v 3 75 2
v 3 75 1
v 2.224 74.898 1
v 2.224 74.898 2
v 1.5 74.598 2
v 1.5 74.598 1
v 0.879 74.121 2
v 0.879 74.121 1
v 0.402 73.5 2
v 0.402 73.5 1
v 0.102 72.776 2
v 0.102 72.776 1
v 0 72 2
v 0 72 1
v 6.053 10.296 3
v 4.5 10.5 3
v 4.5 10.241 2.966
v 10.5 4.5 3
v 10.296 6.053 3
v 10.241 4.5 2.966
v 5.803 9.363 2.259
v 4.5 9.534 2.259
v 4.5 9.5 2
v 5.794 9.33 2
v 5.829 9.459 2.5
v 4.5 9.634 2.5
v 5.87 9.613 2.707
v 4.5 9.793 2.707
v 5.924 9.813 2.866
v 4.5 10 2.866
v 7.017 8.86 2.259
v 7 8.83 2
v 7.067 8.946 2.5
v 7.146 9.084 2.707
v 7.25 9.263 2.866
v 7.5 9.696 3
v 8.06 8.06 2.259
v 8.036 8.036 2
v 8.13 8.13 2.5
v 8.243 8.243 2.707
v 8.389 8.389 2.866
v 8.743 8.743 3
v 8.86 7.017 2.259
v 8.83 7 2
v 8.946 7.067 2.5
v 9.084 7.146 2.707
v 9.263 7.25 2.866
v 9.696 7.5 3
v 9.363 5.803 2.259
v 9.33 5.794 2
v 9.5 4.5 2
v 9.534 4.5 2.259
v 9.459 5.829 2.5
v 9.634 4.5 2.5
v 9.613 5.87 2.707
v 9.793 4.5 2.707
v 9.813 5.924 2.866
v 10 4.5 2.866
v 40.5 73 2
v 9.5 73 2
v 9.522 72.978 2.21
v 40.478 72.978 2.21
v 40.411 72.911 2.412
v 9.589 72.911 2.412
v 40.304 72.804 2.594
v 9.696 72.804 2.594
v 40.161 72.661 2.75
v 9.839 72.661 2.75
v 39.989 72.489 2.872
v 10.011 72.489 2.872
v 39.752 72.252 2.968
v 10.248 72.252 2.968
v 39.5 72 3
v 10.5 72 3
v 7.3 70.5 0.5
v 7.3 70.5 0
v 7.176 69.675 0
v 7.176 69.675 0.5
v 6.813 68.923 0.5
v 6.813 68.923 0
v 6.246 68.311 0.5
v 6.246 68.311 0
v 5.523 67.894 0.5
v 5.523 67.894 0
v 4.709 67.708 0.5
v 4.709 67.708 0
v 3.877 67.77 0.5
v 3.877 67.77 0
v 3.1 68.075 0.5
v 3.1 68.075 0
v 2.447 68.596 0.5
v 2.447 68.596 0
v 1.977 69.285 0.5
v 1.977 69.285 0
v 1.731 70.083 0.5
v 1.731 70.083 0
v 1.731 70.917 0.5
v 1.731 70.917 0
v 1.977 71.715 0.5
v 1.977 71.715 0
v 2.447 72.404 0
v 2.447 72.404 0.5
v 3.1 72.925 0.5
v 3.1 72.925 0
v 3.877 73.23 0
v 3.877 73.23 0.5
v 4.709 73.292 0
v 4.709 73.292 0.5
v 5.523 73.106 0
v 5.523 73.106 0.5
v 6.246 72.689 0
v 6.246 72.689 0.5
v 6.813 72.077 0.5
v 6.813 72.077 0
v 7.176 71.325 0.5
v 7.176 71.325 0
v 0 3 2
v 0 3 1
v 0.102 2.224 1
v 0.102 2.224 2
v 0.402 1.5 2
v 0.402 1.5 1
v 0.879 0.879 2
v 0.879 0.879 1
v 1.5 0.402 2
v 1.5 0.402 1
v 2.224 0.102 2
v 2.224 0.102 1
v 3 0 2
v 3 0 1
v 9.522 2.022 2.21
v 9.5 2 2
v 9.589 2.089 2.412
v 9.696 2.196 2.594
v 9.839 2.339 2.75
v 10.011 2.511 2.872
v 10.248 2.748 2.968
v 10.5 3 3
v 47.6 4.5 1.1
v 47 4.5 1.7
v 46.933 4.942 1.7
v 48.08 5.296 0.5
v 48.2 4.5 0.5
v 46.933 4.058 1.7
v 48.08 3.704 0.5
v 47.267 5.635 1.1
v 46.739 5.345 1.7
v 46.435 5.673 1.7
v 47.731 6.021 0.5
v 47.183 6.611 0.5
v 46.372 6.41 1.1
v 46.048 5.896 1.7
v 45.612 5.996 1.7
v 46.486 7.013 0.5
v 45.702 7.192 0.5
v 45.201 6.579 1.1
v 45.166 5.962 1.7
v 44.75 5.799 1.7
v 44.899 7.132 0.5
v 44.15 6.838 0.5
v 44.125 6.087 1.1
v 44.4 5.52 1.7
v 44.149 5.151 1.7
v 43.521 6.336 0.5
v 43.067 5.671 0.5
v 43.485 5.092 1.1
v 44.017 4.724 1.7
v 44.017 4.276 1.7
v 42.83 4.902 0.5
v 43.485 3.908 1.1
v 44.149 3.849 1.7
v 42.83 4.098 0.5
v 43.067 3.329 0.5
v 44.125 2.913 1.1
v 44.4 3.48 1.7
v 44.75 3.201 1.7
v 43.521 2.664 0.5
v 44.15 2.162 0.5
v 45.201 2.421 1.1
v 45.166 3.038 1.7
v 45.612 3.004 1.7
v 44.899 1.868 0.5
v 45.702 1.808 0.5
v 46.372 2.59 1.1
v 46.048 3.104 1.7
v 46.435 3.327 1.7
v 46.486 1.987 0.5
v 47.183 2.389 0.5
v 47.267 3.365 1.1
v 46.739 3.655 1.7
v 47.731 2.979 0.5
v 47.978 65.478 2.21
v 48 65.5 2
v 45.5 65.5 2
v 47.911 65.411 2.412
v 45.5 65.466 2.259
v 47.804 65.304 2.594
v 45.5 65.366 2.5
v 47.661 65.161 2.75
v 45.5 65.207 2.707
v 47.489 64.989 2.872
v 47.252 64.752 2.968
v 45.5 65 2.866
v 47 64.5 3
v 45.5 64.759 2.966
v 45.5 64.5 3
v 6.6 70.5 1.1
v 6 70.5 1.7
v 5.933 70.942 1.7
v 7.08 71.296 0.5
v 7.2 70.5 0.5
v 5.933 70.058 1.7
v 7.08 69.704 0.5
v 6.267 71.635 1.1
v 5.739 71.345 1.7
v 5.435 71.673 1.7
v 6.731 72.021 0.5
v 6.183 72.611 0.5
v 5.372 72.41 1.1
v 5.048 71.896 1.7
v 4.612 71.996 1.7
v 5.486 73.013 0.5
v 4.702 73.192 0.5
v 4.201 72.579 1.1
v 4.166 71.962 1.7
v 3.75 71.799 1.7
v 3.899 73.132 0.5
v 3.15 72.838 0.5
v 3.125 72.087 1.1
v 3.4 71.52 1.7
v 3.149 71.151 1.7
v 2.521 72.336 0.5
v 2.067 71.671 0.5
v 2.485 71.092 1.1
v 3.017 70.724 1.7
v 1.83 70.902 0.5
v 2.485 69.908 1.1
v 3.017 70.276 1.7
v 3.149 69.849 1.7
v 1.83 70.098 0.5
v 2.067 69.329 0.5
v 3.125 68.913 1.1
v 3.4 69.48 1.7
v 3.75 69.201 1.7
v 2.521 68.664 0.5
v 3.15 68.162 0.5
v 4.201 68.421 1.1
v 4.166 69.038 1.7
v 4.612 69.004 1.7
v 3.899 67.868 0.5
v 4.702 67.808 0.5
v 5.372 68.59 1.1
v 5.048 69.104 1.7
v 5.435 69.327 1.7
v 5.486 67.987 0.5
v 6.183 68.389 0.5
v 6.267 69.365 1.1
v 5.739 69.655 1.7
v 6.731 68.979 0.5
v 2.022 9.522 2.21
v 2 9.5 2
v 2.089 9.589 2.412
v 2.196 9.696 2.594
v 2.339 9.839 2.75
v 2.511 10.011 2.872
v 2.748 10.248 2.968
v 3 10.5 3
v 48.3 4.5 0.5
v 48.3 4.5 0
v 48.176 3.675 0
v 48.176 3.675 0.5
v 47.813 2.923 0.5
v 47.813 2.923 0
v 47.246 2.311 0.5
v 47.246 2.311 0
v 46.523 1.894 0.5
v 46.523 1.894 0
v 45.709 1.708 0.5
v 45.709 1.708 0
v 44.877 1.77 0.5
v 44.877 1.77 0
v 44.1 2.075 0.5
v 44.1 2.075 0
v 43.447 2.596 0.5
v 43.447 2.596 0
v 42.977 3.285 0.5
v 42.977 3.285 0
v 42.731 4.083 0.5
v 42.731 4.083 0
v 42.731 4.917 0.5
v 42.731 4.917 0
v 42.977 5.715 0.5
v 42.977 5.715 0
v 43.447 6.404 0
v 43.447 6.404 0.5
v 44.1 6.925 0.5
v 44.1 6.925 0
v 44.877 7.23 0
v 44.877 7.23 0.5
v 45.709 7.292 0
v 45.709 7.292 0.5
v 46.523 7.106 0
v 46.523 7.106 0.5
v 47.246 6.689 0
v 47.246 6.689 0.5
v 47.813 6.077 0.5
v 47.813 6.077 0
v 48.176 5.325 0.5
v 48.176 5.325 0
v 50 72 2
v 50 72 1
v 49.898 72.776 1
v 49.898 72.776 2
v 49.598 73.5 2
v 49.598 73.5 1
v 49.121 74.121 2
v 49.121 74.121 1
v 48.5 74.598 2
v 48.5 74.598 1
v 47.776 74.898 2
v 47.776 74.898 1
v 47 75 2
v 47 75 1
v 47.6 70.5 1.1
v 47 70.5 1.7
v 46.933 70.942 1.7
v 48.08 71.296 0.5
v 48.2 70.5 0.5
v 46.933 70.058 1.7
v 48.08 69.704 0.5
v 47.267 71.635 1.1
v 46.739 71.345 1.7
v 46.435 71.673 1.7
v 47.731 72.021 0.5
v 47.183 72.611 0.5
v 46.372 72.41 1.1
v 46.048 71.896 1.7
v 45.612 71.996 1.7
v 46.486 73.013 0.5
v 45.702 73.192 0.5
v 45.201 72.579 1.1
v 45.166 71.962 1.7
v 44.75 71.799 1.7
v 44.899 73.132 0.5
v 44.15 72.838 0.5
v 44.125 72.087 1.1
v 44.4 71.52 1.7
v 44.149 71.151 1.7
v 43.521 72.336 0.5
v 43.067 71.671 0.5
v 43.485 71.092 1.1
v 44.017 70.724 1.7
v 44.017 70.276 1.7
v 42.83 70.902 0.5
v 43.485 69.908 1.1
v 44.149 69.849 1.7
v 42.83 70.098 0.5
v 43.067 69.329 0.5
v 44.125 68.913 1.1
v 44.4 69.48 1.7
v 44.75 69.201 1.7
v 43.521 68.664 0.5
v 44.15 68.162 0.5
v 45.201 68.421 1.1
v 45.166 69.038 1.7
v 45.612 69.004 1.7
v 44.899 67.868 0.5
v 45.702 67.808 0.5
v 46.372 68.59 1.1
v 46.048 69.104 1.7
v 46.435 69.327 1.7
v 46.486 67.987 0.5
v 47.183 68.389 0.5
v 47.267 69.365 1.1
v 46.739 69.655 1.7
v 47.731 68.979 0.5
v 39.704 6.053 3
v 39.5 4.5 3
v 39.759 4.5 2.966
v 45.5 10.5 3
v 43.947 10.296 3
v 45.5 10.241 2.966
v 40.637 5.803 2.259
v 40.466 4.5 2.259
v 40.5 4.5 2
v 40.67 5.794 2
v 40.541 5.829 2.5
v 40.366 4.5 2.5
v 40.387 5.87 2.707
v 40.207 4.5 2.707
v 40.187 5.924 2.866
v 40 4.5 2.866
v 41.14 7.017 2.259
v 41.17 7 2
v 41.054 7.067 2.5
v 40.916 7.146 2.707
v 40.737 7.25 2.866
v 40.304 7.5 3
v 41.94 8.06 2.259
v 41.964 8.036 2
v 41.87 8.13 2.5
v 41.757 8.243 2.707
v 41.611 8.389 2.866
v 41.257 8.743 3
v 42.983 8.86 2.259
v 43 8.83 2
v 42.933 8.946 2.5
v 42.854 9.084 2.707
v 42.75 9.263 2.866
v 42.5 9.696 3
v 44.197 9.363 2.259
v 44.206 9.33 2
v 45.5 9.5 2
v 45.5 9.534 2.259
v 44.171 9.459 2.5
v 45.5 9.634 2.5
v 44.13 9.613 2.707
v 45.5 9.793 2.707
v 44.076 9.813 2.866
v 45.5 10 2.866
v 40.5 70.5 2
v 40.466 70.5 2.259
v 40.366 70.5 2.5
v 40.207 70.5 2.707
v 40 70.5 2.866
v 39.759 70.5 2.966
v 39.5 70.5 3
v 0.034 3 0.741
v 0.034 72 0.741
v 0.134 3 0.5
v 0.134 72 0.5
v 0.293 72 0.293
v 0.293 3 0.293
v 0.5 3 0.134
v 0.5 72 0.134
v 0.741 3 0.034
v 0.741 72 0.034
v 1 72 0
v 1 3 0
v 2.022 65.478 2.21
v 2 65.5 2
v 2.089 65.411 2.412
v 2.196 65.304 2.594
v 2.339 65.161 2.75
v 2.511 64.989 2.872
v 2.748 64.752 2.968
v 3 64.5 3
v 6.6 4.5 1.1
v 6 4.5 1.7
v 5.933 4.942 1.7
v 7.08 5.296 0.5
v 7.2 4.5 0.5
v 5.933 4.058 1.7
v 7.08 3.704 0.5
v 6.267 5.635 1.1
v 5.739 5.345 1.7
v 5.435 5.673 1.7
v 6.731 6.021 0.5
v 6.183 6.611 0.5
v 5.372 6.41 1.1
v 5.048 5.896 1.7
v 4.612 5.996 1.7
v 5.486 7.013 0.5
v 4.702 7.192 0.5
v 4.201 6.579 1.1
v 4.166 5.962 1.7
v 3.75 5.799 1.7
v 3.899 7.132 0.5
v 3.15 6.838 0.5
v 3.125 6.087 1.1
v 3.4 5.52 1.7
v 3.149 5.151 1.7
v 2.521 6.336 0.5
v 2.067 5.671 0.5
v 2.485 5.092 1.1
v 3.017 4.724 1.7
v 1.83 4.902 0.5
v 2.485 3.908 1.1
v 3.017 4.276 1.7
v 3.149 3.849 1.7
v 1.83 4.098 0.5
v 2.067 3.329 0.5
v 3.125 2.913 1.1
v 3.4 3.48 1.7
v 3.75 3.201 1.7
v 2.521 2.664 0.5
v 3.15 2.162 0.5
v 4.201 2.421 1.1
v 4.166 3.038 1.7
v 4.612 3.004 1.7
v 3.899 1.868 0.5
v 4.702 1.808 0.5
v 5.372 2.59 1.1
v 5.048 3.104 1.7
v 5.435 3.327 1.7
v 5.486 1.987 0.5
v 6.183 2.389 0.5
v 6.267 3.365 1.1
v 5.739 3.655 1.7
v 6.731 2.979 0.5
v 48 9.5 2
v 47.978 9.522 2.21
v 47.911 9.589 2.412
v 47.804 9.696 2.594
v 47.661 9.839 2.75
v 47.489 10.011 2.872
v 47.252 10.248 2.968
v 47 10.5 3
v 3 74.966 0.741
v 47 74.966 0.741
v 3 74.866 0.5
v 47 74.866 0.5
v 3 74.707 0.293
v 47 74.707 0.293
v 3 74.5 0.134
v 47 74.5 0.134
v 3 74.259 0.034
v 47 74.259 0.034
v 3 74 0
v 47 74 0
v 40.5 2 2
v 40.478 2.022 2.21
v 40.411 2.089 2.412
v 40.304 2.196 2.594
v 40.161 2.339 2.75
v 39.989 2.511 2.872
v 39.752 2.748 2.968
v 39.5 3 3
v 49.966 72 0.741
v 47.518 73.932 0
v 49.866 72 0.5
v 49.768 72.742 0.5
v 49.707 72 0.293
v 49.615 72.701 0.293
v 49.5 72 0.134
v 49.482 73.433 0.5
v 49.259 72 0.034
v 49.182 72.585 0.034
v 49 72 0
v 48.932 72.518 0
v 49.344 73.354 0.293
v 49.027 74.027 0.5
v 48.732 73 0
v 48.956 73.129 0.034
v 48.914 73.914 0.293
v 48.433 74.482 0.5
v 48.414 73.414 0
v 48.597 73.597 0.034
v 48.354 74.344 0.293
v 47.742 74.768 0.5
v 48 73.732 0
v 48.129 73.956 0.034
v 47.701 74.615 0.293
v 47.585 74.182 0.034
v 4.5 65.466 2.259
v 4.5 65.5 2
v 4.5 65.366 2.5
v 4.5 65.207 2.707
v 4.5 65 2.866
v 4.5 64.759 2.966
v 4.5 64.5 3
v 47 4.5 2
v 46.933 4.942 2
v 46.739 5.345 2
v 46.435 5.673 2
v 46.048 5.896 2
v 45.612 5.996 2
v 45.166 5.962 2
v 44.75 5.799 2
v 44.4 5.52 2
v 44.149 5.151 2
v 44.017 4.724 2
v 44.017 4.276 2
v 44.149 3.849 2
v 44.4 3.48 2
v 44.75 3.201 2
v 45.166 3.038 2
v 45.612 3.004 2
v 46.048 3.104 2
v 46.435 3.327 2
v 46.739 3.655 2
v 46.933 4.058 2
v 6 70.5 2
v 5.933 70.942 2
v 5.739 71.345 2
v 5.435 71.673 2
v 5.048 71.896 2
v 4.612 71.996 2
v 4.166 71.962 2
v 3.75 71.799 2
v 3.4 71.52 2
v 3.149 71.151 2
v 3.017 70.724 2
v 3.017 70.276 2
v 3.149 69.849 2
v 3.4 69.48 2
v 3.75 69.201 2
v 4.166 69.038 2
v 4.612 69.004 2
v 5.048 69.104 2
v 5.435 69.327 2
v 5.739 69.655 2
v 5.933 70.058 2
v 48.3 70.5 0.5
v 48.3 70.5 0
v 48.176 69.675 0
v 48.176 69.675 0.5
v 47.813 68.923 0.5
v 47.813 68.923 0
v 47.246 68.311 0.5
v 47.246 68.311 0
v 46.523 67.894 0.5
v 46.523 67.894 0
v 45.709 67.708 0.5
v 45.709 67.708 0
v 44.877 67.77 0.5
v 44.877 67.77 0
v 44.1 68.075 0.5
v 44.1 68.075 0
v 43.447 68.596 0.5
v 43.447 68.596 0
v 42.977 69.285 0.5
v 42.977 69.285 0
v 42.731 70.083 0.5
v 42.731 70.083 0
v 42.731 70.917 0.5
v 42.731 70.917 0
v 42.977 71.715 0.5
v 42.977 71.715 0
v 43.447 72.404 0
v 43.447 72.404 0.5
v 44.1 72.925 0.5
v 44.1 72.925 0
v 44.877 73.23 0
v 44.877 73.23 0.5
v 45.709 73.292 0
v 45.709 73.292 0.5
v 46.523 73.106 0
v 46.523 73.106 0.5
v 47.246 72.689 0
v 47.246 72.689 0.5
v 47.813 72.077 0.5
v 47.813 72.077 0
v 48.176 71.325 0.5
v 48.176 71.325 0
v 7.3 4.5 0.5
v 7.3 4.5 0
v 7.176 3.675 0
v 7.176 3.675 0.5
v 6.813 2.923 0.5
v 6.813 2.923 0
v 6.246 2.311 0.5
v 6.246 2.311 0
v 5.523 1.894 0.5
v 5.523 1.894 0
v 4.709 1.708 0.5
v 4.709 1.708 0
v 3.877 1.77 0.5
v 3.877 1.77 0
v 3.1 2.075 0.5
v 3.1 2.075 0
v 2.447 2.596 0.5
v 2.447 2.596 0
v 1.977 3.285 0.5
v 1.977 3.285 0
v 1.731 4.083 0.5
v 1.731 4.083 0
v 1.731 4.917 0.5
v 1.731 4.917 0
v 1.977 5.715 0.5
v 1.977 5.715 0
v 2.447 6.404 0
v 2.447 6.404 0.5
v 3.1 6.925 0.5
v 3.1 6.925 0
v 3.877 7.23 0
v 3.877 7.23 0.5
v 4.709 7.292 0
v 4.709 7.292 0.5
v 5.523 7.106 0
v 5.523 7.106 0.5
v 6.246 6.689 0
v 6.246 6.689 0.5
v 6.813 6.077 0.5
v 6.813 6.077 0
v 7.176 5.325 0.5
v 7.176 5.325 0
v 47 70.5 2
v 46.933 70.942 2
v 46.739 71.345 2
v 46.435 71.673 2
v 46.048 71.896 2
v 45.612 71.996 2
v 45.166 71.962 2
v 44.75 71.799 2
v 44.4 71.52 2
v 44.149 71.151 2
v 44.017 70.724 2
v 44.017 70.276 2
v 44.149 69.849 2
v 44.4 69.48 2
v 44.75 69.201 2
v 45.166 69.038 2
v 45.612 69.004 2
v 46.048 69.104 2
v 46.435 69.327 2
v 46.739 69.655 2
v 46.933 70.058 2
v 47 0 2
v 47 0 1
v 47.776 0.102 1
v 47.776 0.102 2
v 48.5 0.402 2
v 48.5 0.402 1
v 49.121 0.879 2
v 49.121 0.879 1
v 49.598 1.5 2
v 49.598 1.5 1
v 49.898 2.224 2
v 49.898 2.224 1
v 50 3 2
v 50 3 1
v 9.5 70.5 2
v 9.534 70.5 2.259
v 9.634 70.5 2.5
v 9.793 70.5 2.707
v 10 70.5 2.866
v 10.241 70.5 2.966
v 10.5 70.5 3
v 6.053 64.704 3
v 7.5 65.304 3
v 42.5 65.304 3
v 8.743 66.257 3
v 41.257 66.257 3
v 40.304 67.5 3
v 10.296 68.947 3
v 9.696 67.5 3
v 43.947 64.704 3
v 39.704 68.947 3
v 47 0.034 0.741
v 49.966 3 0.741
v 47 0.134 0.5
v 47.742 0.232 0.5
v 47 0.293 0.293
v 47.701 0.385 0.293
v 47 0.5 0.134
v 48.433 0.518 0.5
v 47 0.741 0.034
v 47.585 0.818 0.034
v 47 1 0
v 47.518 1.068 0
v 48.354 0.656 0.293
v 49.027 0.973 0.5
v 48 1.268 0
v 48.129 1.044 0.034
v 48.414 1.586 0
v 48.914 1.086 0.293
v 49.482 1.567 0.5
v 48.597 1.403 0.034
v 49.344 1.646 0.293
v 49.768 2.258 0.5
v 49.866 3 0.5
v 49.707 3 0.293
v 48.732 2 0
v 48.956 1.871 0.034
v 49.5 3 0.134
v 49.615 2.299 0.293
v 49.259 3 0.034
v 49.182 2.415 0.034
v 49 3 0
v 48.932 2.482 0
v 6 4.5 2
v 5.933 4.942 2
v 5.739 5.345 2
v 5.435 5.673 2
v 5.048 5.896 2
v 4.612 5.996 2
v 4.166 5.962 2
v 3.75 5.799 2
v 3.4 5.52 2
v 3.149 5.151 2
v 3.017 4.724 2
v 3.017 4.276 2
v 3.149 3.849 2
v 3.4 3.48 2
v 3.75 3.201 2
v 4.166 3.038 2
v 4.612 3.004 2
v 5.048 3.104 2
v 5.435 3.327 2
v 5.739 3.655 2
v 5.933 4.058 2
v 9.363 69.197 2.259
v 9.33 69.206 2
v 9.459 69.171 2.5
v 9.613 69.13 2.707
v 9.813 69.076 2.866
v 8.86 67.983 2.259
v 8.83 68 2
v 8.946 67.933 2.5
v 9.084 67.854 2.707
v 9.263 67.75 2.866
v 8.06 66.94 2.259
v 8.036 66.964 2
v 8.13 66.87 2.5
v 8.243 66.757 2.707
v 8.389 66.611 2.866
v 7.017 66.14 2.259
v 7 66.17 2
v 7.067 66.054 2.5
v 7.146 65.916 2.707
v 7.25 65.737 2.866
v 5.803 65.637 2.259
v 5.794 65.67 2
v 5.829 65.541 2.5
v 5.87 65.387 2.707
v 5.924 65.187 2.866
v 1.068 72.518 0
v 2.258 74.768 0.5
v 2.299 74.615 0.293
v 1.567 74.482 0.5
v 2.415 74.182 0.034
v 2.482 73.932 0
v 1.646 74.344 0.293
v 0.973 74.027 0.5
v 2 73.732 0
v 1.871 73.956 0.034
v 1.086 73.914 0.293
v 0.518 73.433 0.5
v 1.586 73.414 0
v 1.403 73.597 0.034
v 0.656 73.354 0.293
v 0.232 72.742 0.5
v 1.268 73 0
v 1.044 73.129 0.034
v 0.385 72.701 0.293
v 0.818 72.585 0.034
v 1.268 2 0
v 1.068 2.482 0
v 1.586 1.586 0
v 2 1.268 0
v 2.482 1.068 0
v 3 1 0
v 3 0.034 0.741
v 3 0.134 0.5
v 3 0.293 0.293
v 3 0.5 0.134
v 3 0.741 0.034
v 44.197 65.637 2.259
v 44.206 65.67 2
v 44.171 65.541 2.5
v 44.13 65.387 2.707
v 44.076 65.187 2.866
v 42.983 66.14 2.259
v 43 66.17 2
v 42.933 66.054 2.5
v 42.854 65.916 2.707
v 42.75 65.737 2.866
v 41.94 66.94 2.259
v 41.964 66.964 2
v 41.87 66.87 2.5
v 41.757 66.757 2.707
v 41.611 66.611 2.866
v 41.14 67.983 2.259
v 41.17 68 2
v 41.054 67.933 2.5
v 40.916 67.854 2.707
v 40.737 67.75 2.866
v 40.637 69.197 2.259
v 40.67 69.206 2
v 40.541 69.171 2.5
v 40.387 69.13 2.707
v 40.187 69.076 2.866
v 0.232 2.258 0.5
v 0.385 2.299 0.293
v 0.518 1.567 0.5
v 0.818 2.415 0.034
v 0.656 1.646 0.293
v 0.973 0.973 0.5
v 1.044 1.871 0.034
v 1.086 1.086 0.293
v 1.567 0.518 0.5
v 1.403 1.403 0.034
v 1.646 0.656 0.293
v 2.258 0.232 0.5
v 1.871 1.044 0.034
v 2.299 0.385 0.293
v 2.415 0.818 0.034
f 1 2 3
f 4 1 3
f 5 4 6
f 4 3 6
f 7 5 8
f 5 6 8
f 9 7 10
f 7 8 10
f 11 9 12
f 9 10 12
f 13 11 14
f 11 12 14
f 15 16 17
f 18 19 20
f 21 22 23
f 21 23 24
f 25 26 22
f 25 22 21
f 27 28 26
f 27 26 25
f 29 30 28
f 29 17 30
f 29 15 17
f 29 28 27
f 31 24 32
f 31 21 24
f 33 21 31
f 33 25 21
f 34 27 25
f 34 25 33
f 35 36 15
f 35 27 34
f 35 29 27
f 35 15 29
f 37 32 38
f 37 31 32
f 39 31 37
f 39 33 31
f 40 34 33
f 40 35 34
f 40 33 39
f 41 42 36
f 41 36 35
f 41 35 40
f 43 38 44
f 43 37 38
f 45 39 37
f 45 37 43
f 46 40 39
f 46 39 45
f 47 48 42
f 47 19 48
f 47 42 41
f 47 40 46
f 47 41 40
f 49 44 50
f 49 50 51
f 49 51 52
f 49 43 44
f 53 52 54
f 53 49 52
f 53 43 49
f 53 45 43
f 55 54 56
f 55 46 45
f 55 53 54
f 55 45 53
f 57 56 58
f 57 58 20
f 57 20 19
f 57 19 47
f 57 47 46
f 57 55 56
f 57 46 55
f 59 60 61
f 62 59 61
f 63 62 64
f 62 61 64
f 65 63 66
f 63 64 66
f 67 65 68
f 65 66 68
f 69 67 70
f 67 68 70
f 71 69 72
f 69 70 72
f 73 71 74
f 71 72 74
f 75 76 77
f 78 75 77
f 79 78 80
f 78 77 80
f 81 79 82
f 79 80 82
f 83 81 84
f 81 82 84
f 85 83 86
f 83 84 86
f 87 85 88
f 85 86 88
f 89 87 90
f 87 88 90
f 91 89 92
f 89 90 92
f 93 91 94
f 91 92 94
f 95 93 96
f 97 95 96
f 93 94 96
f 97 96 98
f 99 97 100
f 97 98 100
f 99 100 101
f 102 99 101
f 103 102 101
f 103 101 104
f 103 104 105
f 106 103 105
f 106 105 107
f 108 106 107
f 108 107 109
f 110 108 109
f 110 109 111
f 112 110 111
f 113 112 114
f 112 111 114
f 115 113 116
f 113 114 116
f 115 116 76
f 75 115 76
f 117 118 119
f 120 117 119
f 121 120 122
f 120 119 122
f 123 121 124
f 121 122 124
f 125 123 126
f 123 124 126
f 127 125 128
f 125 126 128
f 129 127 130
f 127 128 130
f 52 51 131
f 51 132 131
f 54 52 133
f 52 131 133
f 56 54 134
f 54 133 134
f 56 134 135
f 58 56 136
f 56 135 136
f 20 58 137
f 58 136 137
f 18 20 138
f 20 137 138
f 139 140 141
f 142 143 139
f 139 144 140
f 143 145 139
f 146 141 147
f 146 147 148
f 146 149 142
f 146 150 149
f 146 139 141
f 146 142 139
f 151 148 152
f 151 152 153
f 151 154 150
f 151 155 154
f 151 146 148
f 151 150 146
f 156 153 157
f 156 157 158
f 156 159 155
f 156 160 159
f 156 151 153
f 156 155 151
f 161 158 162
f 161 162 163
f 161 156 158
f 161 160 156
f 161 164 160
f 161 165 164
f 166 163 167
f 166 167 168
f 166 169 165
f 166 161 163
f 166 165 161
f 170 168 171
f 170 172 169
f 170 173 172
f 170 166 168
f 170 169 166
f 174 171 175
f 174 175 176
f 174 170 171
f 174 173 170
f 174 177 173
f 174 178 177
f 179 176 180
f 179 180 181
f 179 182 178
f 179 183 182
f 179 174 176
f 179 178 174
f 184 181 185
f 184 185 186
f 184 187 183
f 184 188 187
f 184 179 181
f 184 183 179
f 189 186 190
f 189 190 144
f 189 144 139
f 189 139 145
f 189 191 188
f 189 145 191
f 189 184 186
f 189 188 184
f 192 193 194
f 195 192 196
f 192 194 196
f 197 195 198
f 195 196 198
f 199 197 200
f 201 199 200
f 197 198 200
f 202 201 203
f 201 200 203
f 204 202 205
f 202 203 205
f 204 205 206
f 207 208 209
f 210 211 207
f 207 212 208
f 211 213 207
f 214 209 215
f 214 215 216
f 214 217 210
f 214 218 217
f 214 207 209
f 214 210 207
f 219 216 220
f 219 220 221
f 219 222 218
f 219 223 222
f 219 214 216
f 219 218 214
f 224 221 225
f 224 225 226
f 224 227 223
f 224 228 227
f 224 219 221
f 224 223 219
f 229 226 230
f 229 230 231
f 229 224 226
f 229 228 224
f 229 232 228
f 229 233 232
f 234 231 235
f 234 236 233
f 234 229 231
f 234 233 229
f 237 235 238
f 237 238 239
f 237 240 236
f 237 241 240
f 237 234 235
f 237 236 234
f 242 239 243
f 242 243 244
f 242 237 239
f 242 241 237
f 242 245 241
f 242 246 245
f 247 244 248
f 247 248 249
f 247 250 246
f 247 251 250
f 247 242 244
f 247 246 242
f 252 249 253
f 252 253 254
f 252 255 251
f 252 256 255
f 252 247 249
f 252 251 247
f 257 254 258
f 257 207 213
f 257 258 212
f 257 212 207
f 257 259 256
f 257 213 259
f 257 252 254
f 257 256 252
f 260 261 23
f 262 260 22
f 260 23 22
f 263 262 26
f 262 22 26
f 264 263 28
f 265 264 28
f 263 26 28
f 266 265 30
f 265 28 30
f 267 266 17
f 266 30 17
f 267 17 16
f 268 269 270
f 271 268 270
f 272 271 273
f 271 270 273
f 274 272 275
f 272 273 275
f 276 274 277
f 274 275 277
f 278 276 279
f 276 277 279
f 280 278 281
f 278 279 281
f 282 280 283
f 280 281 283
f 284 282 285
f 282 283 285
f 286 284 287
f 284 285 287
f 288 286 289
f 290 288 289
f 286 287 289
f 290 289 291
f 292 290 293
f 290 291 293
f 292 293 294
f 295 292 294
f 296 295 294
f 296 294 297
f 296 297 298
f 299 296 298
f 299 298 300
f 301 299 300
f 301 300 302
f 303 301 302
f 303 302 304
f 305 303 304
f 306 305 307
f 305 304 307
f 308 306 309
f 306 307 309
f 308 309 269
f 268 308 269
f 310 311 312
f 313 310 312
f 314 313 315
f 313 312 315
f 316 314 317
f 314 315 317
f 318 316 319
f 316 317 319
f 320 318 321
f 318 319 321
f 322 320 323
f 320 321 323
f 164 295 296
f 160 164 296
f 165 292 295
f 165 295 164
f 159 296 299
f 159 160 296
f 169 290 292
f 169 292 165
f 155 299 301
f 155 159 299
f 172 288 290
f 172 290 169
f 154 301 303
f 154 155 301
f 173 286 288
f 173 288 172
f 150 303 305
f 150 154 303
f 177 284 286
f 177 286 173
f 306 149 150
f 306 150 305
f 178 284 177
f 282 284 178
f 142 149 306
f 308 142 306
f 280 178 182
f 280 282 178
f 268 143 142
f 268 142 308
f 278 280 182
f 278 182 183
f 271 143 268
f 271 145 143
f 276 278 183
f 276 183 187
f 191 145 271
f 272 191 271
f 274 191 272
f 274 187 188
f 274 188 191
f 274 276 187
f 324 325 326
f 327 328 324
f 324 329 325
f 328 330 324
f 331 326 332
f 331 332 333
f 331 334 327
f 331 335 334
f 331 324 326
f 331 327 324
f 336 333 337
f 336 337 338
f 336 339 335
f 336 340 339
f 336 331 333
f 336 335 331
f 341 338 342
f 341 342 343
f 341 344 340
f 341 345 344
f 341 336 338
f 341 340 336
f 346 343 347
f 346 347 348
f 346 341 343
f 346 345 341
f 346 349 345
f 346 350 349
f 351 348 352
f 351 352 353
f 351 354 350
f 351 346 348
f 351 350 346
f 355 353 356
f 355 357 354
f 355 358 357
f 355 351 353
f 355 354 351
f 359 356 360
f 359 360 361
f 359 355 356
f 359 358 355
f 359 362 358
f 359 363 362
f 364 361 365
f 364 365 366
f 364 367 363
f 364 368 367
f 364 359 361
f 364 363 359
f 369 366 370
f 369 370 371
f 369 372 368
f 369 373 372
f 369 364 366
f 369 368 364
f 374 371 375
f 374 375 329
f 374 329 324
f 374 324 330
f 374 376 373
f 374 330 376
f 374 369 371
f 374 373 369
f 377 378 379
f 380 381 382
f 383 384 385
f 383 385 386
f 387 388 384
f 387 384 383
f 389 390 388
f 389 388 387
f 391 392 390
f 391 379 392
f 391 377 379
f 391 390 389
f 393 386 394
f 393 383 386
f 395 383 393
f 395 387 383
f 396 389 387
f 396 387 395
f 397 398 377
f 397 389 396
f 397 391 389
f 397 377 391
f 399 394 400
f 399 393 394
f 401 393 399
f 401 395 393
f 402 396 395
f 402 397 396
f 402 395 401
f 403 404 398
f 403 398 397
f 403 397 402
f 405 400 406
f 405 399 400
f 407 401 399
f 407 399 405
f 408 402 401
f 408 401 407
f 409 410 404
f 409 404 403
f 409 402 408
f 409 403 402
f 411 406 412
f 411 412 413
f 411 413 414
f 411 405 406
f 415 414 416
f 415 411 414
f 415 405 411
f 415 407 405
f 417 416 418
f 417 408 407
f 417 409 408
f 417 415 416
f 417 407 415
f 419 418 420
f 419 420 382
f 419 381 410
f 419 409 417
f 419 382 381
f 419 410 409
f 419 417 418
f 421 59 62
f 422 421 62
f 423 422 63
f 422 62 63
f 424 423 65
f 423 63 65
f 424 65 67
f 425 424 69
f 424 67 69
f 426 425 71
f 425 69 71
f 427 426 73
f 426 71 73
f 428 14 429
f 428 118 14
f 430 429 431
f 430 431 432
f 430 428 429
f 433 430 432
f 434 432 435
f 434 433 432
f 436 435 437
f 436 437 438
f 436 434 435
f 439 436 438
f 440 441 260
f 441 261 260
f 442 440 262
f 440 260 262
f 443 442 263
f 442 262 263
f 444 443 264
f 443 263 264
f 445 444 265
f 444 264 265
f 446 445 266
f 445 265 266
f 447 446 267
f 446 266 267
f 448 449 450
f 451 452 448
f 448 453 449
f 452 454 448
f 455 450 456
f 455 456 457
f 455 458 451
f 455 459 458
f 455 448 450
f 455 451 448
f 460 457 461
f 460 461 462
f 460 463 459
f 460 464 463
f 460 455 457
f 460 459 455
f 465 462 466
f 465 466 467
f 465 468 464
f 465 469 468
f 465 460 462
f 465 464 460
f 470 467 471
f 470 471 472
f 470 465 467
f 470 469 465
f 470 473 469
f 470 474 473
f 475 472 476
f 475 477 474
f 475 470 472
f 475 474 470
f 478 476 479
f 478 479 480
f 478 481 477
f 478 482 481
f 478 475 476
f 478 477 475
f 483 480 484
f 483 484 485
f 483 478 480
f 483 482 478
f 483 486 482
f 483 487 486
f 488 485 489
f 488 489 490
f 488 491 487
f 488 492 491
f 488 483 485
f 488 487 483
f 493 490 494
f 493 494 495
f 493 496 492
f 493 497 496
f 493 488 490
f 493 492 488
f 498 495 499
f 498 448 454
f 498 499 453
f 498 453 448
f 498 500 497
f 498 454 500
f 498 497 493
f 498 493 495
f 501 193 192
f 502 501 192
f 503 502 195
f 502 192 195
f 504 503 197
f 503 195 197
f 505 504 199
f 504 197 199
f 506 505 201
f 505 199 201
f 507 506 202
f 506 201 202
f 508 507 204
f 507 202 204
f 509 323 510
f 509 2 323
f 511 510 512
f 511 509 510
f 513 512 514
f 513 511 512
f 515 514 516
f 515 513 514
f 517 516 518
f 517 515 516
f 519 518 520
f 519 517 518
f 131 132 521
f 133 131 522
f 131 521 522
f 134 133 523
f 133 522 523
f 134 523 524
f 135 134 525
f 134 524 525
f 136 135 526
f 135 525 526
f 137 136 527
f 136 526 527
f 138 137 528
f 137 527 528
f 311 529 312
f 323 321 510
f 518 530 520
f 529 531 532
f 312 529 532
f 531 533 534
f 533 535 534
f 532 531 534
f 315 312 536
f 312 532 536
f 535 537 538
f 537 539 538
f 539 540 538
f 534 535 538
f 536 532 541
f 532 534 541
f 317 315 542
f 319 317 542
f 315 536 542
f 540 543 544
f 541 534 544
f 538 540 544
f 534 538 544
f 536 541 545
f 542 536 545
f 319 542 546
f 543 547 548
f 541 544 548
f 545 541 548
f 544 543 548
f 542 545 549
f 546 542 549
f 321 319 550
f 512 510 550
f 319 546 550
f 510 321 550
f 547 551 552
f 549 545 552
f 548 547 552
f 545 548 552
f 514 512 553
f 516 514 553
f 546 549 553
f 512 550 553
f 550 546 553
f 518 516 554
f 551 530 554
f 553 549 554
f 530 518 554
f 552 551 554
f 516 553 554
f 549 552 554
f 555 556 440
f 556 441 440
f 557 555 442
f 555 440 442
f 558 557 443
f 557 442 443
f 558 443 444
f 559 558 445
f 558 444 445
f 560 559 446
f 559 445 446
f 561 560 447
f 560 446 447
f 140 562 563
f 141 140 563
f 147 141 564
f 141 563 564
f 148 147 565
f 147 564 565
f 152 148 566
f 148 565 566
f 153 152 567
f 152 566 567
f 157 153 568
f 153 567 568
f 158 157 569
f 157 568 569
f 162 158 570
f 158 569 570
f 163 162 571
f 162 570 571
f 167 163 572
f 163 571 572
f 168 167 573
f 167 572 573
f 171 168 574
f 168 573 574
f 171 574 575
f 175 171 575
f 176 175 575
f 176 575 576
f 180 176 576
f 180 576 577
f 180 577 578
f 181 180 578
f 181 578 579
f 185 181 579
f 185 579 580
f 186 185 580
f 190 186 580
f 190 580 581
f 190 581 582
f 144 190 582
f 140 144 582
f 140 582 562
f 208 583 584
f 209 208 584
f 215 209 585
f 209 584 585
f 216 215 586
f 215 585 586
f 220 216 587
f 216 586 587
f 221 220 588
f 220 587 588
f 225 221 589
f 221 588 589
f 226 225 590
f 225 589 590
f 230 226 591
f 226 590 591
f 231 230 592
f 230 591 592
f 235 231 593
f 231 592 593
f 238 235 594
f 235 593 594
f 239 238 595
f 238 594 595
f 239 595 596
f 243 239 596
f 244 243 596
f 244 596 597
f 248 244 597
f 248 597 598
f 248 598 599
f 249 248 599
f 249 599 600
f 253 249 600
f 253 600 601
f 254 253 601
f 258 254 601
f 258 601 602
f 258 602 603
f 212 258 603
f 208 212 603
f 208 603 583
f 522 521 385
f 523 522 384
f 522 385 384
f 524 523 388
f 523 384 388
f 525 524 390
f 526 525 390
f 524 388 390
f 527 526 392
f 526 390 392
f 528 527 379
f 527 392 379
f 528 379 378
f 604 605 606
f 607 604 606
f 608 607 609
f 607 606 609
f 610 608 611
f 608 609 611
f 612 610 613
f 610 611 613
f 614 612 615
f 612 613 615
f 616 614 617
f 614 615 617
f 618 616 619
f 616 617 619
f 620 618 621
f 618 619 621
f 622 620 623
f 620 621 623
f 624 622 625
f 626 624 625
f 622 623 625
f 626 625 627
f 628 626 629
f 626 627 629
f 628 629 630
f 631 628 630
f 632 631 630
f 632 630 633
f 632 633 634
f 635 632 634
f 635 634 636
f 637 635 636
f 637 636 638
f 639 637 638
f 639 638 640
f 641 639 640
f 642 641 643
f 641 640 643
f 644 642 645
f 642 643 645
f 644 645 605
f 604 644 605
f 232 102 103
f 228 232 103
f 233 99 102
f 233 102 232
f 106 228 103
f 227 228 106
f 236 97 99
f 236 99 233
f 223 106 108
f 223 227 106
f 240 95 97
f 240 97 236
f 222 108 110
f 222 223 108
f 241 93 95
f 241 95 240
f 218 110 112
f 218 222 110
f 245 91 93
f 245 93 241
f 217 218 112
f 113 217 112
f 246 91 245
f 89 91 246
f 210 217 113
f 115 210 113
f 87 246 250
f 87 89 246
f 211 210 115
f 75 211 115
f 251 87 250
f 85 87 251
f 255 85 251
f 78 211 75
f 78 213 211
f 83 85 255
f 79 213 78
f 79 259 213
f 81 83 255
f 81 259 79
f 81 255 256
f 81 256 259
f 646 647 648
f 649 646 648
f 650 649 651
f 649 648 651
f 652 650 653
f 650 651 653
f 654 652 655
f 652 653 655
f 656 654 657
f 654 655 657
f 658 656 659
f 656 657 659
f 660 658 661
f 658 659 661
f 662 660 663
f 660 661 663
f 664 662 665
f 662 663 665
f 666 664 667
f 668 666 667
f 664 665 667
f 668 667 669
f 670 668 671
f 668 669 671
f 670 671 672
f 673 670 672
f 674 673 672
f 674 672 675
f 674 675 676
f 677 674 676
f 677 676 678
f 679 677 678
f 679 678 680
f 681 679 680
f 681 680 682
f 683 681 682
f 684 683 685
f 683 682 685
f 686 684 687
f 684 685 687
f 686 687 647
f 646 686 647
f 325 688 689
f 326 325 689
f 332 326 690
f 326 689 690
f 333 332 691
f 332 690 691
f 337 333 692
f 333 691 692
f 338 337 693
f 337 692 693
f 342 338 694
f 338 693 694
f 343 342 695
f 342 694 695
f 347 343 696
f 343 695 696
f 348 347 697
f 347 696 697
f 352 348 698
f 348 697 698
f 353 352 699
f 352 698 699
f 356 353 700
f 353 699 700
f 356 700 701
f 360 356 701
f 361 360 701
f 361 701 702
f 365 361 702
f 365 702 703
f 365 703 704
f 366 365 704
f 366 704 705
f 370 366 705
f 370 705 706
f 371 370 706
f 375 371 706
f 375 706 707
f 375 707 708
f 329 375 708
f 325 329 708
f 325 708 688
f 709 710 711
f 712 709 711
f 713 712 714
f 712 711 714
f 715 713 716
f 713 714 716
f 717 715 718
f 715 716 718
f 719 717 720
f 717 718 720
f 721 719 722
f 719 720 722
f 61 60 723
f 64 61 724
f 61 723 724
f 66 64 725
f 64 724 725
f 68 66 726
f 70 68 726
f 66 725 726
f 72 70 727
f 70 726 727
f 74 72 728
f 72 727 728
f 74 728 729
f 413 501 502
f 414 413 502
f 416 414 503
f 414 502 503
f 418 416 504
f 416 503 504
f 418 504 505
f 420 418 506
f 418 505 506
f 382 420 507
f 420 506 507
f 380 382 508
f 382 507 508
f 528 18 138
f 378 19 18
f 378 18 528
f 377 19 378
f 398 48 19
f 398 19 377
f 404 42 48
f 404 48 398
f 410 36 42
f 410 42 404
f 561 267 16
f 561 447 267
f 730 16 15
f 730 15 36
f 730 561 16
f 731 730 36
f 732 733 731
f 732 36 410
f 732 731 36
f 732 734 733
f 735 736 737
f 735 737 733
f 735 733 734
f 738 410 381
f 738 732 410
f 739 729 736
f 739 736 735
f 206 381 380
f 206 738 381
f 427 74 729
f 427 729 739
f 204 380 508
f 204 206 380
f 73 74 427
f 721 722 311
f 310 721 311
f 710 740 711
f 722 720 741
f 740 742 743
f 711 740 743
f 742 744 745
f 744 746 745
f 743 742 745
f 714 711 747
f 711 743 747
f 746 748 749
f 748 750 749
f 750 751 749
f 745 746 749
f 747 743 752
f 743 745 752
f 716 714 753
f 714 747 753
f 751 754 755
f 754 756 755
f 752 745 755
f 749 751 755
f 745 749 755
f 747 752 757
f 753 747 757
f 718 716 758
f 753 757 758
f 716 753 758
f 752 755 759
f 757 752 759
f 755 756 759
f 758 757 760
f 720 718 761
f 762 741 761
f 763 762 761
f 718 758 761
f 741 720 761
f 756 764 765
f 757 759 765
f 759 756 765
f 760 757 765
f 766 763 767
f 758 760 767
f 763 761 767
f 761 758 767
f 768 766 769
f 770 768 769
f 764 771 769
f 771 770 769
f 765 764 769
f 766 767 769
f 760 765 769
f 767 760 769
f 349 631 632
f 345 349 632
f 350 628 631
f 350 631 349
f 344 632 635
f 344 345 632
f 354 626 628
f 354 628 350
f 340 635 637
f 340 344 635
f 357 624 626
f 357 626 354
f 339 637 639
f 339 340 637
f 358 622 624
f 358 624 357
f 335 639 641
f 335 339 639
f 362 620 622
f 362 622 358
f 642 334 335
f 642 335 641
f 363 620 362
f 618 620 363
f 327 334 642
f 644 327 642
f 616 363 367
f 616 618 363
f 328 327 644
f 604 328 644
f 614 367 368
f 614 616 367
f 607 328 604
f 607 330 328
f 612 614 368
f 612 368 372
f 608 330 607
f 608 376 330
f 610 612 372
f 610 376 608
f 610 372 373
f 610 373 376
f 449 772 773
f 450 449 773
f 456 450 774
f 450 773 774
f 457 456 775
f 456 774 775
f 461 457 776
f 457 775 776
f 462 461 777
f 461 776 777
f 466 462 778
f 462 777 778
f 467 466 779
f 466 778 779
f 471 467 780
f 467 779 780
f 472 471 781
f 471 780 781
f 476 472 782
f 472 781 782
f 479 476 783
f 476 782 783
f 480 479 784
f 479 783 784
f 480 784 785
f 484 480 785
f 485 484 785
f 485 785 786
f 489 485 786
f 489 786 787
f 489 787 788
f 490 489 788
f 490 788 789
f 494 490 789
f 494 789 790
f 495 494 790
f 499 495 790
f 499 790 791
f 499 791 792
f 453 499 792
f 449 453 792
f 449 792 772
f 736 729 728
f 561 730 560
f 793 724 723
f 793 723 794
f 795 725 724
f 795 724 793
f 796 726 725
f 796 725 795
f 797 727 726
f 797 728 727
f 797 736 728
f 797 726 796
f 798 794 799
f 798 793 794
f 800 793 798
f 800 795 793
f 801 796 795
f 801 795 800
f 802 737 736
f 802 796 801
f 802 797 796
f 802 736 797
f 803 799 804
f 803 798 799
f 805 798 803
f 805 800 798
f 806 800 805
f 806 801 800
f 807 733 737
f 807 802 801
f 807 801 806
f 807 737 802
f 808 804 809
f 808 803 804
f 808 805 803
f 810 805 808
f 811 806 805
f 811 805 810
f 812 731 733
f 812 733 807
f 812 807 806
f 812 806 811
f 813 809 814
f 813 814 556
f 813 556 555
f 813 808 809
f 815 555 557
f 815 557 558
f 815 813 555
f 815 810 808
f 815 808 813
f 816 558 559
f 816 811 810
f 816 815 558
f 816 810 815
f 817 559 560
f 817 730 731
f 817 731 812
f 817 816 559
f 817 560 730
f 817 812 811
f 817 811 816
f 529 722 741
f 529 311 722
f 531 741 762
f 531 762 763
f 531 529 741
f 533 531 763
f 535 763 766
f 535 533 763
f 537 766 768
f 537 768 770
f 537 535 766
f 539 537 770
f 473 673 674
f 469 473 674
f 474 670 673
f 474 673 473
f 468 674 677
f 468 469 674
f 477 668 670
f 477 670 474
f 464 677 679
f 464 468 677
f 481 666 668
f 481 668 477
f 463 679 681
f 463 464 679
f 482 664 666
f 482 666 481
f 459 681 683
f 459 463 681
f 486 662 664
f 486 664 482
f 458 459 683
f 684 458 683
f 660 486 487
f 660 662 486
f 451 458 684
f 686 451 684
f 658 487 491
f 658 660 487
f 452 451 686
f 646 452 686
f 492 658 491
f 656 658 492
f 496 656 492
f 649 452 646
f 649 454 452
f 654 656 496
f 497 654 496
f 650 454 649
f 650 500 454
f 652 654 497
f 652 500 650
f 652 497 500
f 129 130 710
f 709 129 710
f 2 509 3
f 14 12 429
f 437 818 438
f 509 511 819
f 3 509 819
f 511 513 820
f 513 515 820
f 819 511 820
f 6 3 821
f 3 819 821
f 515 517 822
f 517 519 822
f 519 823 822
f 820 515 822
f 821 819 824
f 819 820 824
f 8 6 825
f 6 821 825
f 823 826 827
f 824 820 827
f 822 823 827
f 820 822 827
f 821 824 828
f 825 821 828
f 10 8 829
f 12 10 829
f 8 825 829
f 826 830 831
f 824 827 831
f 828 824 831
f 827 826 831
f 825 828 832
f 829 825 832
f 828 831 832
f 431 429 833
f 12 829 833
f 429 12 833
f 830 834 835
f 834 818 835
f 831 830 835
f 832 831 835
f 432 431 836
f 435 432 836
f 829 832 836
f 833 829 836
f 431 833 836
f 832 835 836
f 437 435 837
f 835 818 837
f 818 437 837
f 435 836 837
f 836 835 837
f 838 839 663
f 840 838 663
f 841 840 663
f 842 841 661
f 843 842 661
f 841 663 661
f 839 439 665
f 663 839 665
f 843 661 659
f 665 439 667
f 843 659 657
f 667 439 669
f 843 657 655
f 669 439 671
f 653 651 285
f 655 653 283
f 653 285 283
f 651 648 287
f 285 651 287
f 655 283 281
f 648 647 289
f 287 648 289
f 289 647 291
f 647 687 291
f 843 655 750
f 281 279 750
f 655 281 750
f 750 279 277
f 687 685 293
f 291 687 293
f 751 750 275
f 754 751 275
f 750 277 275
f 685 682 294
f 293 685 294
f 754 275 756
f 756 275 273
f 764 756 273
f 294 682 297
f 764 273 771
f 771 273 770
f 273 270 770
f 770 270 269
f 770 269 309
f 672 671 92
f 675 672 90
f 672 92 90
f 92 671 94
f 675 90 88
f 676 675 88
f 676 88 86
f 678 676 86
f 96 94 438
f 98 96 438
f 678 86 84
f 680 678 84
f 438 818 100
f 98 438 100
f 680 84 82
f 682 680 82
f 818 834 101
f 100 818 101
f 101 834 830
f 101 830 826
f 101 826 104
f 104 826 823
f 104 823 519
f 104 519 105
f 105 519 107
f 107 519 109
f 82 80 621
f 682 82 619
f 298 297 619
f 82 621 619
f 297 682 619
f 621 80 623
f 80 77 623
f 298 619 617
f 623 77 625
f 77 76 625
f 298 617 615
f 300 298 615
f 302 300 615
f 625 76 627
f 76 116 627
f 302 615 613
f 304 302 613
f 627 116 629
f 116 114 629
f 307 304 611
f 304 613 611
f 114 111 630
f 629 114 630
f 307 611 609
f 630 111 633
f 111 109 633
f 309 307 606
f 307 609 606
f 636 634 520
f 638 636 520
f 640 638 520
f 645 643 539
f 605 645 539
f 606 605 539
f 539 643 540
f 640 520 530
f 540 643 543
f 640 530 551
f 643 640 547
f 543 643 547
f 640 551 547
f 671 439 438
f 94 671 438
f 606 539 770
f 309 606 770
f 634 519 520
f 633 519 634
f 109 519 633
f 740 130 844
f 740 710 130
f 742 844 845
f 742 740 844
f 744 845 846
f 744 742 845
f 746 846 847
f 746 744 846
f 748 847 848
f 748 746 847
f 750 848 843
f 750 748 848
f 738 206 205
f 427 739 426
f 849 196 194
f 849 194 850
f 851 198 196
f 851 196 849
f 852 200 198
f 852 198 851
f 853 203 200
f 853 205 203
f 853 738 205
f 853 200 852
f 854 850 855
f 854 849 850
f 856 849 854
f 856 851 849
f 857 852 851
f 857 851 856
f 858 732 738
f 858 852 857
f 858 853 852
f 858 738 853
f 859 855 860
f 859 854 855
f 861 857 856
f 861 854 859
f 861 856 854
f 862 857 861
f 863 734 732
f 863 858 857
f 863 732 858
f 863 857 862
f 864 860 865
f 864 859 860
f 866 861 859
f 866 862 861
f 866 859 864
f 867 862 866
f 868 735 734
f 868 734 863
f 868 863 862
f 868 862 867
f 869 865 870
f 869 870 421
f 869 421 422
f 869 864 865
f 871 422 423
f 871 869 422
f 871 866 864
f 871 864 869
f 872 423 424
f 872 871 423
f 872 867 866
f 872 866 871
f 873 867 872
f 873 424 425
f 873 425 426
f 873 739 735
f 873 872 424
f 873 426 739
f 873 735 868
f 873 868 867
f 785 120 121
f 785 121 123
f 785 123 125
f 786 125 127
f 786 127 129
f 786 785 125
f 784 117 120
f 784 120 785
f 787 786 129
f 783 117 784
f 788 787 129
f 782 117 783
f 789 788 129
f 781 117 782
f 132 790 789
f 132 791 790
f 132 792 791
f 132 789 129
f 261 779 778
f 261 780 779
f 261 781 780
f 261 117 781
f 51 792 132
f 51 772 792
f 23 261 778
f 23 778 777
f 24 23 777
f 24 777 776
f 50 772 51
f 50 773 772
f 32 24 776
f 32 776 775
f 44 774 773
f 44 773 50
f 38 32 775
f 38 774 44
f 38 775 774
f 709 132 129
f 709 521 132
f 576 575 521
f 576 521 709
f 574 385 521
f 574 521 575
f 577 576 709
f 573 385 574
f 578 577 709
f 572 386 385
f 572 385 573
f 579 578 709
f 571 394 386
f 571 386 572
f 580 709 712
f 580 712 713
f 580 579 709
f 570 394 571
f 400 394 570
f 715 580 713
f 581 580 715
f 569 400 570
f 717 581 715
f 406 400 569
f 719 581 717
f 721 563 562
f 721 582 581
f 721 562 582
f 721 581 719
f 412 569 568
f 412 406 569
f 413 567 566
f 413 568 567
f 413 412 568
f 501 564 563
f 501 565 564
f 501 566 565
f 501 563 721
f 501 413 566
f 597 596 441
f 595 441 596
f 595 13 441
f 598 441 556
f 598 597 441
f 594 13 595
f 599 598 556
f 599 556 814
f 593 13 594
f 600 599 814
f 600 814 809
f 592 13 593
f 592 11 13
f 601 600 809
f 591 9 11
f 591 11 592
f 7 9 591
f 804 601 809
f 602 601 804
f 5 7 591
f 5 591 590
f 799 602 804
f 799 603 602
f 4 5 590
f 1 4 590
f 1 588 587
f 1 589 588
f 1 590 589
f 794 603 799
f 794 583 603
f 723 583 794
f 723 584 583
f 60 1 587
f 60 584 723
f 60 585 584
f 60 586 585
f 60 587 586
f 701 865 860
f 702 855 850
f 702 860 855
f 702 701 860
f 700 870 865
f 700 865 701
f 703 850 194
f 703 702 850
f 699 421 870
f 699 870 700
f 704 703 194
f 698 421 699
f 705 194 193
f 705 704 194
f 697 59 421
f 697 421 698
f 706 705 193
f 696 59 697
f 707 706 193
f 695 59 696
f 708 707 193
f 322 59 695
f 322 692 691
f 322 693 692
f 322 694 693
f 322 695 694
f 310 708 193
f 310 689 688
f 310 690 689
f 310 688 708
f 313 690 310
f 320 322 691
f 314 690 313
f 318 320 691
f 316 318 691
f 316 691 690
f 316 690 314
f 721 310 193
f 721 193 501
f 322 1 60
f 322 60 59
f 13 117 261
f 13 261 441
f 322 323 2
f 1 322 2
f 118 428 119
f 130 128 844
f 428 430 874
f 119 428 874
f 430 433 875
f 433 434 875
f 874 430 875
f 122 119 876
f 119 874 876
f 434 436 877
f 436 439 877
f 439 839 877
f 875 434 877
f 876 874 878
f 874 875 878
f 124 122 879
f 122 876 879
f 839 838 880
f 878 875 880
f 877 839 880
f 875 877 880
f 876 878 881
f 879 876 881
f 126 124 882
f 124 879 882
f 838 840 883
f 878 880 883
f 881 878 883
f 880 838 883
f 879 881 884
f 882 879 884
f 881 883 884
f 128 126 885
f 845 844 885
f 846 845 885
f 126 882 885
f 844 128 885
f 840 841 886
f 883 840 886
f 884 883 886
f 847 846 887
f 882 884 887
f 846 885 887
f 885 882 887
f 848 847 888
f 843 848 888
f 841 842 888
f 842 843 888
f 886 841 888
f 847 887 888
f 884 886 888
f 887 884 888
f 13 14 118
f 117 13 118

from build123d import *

# Parameters (mm, degrees)
F1_DEPTH  = 2
F2_R      = 1.5
F3_DEPTH  = 5
F4_W      = 31
F4_H      = 56
F5_DEPTH  = 1
F6_R      = 0.99999
F7_R      = 1
F8_R      = 2.8
F9_DEPTH  = 0.5
F10_SIZE2 = 1.2
F10_SIZE  = 1.2


# Not quite as in the source:
# - a fillet or chamfer is up to 0.001 mm smaller than in the source, because OpenCascade refuses the exact size
# - a feature names something its author has since deleted; it is built from what else it names


with BuildPart() as f1:
    # F0 (on Top) → F1 (new body)
    with BuildSketch(Plane.XY):
        with BuildLine():
            ThreePointArc((0, 3), (0.8786796564, 0.8786796564), (3, 0))
            Line((3, 0), (47, 0))
            ThreePointArc((47, 0), (49.1213203436, 0.8786796564), (50, 3))
            Line((50, 3), (50, 72))
            ThreePointArc((50, 72), (49.1213203436, 74.1213203436), (47, 75))
            Line((47, 75), (3, 75))
            ThreePointArc((3, 75), (0.8786796564, 74.1213203436), (0, 72))
            Line((0, 72), (0, 3))
        make_face()
    extrude(amount=F1_DEPTH)

    # F2 (on face) → F3 (cut)
    with BuildSketch(Plane.XY.offset(2)):
        with Locations((4.5, 70.5)):
            Circle(F2_R)
        with Locations((45.5, 70.5)):
            Circle(F2_R)
        with Locations((4.5, 4.5)):
            Circle(F2_R)
        with Locations((45.5, 4.5)):
            Circle(F2_R)
    extrude(amount=-F3_DEPTH, mode=Mode.SUBTRACT)

    # F4 (on face) → F5 (join)
    with BuildSketch(Plane.XY.offset(2)):
        Polygon((9.5, 9.5), (9.5, 4.5), (9.5, 2), (40.5, 2), (40.5, 4.5), (40.5, 9.5), align=None)
        Polygon((9.5, 70.5), (9.5, 65.5), (40.5, 65.5), (40.5, 70.5), (40.5, 73), (9.5, 73), align=None)
        Polygon((2, 9.5), (4.5, 9.5), (9.5, 9.5), (9.5, 65.5), (4.5, 65.5), (2, 65.5), align=None)
        with Locations((25, 37.5)):
            Rectangle(F4_W, F4_H)
        Polygon((40.5, 65.5), (40.5, 9.5), (45.5, 9.5), (48, 9.5), (48, 65.5), (45.5, 65.5), align=None)
        with BuildLine():
            Line((4.5, 65.5), (9.5, 65.5))
            Line((9.5, 65.5), (9.5, 70.5))
            ThreePointArc((9.5, 70.5), (8.0355339059, 66.9644660941), (4.5, 65.5))
        make_face()
        with BuildLine():
            Line((40.5, 70.5), (40.5, 65.5))
            Line((40.5, 65.5), (45.5, 65.5))
            ThreePointArc((45.5, 65.5), (41.9644660941, 66.9644660941), (40.5, 70.5))
        make_face()
        with BuildLine():
            Line((45.5, 9.5), (40.5, 9.5))
            Line((40.5, 9.5), (40.5, 4.5))
            ThreePointArc((40.5, 4.5), (41.9644660941, 8.0355339059), (45.5, 9.5))
        make_face()
        with BuildLine():
            ThreePointArc((4.5, 9.5), (8.0355339059, 8.0355339059), (9.5, 4.5))
            Line((9.5, 4.5), (9.5, 9.5))
            Line((9.5, 9.5), (4.5, 9.5))
        make_face()
    extrude(amount=F5_DEPTH)

    # F6 (radius 1 in the source; OpenCascade refuses exactly that, so slightly less here)
    f6_edges = [f1.edges().sort_by_distance(p)[0] for p in [
        (9.5, 3.25, 3),
        (25, 2, 3),
        (40.5, 3.25, 3),
        (41.964466, 8.035534, 3),
        (46.75, 9.5, 3),
        (48, 37.5, 3),
        (46.75, 65.5, 3),
        (41.964466, 66.964466, 3),
        (40.5, 71.75, 3),
        (25, 73, 3),
        (9.5, 71.75, 3),
        (8.035534, 66.964466, 3),
        (3.25, 65.5, 3),
        (2, 37.5, 3),
        (3.25, 9.5, 3),
        (8.035534, 8.035534, 3),
    ]]
    fillet(f6_edges, radius=F6_R)

    # F7
    f7_edges = [f1.edges().sort_by_distance(p)[0] for p in [
        (0, 37.5, 0),
    ]]
    fillet(f7_edges, radius=F7_R)

    # F8 (on face) → F9 (cut)
    with BuildSketch(Plane(origin=(0, 0, 0), x_dir=(1, 0, 0), z_dir=(0, 0, -1))):
        with Locations((4.5, -4.5)):
            Circle(F8_R)
        with Locations((45.5, -4.5)):
            Circle(F8_R)
        with Locations((45.5, -70.5)):
            Circle(F8_R)
        with Locations((4.5, -70.5)):
            Circle(F8_R)
    extrude(amount=-F9_DEPTH, mode=Mode.SUBTRACT)

    # F10
    f10_edges = [f1.edges().sort_by_distance(p)[0] for p in [
        (3, 4.5, 0.5),
        (44, 4.5, 0.5),
        (3, 70.5, 0.5),
        (44, 70.5, 0.5),
    ]]
    chamfer(f10_edges, length=F10_SIZE, length2=F10_SIZE2)


solid = f1.part
